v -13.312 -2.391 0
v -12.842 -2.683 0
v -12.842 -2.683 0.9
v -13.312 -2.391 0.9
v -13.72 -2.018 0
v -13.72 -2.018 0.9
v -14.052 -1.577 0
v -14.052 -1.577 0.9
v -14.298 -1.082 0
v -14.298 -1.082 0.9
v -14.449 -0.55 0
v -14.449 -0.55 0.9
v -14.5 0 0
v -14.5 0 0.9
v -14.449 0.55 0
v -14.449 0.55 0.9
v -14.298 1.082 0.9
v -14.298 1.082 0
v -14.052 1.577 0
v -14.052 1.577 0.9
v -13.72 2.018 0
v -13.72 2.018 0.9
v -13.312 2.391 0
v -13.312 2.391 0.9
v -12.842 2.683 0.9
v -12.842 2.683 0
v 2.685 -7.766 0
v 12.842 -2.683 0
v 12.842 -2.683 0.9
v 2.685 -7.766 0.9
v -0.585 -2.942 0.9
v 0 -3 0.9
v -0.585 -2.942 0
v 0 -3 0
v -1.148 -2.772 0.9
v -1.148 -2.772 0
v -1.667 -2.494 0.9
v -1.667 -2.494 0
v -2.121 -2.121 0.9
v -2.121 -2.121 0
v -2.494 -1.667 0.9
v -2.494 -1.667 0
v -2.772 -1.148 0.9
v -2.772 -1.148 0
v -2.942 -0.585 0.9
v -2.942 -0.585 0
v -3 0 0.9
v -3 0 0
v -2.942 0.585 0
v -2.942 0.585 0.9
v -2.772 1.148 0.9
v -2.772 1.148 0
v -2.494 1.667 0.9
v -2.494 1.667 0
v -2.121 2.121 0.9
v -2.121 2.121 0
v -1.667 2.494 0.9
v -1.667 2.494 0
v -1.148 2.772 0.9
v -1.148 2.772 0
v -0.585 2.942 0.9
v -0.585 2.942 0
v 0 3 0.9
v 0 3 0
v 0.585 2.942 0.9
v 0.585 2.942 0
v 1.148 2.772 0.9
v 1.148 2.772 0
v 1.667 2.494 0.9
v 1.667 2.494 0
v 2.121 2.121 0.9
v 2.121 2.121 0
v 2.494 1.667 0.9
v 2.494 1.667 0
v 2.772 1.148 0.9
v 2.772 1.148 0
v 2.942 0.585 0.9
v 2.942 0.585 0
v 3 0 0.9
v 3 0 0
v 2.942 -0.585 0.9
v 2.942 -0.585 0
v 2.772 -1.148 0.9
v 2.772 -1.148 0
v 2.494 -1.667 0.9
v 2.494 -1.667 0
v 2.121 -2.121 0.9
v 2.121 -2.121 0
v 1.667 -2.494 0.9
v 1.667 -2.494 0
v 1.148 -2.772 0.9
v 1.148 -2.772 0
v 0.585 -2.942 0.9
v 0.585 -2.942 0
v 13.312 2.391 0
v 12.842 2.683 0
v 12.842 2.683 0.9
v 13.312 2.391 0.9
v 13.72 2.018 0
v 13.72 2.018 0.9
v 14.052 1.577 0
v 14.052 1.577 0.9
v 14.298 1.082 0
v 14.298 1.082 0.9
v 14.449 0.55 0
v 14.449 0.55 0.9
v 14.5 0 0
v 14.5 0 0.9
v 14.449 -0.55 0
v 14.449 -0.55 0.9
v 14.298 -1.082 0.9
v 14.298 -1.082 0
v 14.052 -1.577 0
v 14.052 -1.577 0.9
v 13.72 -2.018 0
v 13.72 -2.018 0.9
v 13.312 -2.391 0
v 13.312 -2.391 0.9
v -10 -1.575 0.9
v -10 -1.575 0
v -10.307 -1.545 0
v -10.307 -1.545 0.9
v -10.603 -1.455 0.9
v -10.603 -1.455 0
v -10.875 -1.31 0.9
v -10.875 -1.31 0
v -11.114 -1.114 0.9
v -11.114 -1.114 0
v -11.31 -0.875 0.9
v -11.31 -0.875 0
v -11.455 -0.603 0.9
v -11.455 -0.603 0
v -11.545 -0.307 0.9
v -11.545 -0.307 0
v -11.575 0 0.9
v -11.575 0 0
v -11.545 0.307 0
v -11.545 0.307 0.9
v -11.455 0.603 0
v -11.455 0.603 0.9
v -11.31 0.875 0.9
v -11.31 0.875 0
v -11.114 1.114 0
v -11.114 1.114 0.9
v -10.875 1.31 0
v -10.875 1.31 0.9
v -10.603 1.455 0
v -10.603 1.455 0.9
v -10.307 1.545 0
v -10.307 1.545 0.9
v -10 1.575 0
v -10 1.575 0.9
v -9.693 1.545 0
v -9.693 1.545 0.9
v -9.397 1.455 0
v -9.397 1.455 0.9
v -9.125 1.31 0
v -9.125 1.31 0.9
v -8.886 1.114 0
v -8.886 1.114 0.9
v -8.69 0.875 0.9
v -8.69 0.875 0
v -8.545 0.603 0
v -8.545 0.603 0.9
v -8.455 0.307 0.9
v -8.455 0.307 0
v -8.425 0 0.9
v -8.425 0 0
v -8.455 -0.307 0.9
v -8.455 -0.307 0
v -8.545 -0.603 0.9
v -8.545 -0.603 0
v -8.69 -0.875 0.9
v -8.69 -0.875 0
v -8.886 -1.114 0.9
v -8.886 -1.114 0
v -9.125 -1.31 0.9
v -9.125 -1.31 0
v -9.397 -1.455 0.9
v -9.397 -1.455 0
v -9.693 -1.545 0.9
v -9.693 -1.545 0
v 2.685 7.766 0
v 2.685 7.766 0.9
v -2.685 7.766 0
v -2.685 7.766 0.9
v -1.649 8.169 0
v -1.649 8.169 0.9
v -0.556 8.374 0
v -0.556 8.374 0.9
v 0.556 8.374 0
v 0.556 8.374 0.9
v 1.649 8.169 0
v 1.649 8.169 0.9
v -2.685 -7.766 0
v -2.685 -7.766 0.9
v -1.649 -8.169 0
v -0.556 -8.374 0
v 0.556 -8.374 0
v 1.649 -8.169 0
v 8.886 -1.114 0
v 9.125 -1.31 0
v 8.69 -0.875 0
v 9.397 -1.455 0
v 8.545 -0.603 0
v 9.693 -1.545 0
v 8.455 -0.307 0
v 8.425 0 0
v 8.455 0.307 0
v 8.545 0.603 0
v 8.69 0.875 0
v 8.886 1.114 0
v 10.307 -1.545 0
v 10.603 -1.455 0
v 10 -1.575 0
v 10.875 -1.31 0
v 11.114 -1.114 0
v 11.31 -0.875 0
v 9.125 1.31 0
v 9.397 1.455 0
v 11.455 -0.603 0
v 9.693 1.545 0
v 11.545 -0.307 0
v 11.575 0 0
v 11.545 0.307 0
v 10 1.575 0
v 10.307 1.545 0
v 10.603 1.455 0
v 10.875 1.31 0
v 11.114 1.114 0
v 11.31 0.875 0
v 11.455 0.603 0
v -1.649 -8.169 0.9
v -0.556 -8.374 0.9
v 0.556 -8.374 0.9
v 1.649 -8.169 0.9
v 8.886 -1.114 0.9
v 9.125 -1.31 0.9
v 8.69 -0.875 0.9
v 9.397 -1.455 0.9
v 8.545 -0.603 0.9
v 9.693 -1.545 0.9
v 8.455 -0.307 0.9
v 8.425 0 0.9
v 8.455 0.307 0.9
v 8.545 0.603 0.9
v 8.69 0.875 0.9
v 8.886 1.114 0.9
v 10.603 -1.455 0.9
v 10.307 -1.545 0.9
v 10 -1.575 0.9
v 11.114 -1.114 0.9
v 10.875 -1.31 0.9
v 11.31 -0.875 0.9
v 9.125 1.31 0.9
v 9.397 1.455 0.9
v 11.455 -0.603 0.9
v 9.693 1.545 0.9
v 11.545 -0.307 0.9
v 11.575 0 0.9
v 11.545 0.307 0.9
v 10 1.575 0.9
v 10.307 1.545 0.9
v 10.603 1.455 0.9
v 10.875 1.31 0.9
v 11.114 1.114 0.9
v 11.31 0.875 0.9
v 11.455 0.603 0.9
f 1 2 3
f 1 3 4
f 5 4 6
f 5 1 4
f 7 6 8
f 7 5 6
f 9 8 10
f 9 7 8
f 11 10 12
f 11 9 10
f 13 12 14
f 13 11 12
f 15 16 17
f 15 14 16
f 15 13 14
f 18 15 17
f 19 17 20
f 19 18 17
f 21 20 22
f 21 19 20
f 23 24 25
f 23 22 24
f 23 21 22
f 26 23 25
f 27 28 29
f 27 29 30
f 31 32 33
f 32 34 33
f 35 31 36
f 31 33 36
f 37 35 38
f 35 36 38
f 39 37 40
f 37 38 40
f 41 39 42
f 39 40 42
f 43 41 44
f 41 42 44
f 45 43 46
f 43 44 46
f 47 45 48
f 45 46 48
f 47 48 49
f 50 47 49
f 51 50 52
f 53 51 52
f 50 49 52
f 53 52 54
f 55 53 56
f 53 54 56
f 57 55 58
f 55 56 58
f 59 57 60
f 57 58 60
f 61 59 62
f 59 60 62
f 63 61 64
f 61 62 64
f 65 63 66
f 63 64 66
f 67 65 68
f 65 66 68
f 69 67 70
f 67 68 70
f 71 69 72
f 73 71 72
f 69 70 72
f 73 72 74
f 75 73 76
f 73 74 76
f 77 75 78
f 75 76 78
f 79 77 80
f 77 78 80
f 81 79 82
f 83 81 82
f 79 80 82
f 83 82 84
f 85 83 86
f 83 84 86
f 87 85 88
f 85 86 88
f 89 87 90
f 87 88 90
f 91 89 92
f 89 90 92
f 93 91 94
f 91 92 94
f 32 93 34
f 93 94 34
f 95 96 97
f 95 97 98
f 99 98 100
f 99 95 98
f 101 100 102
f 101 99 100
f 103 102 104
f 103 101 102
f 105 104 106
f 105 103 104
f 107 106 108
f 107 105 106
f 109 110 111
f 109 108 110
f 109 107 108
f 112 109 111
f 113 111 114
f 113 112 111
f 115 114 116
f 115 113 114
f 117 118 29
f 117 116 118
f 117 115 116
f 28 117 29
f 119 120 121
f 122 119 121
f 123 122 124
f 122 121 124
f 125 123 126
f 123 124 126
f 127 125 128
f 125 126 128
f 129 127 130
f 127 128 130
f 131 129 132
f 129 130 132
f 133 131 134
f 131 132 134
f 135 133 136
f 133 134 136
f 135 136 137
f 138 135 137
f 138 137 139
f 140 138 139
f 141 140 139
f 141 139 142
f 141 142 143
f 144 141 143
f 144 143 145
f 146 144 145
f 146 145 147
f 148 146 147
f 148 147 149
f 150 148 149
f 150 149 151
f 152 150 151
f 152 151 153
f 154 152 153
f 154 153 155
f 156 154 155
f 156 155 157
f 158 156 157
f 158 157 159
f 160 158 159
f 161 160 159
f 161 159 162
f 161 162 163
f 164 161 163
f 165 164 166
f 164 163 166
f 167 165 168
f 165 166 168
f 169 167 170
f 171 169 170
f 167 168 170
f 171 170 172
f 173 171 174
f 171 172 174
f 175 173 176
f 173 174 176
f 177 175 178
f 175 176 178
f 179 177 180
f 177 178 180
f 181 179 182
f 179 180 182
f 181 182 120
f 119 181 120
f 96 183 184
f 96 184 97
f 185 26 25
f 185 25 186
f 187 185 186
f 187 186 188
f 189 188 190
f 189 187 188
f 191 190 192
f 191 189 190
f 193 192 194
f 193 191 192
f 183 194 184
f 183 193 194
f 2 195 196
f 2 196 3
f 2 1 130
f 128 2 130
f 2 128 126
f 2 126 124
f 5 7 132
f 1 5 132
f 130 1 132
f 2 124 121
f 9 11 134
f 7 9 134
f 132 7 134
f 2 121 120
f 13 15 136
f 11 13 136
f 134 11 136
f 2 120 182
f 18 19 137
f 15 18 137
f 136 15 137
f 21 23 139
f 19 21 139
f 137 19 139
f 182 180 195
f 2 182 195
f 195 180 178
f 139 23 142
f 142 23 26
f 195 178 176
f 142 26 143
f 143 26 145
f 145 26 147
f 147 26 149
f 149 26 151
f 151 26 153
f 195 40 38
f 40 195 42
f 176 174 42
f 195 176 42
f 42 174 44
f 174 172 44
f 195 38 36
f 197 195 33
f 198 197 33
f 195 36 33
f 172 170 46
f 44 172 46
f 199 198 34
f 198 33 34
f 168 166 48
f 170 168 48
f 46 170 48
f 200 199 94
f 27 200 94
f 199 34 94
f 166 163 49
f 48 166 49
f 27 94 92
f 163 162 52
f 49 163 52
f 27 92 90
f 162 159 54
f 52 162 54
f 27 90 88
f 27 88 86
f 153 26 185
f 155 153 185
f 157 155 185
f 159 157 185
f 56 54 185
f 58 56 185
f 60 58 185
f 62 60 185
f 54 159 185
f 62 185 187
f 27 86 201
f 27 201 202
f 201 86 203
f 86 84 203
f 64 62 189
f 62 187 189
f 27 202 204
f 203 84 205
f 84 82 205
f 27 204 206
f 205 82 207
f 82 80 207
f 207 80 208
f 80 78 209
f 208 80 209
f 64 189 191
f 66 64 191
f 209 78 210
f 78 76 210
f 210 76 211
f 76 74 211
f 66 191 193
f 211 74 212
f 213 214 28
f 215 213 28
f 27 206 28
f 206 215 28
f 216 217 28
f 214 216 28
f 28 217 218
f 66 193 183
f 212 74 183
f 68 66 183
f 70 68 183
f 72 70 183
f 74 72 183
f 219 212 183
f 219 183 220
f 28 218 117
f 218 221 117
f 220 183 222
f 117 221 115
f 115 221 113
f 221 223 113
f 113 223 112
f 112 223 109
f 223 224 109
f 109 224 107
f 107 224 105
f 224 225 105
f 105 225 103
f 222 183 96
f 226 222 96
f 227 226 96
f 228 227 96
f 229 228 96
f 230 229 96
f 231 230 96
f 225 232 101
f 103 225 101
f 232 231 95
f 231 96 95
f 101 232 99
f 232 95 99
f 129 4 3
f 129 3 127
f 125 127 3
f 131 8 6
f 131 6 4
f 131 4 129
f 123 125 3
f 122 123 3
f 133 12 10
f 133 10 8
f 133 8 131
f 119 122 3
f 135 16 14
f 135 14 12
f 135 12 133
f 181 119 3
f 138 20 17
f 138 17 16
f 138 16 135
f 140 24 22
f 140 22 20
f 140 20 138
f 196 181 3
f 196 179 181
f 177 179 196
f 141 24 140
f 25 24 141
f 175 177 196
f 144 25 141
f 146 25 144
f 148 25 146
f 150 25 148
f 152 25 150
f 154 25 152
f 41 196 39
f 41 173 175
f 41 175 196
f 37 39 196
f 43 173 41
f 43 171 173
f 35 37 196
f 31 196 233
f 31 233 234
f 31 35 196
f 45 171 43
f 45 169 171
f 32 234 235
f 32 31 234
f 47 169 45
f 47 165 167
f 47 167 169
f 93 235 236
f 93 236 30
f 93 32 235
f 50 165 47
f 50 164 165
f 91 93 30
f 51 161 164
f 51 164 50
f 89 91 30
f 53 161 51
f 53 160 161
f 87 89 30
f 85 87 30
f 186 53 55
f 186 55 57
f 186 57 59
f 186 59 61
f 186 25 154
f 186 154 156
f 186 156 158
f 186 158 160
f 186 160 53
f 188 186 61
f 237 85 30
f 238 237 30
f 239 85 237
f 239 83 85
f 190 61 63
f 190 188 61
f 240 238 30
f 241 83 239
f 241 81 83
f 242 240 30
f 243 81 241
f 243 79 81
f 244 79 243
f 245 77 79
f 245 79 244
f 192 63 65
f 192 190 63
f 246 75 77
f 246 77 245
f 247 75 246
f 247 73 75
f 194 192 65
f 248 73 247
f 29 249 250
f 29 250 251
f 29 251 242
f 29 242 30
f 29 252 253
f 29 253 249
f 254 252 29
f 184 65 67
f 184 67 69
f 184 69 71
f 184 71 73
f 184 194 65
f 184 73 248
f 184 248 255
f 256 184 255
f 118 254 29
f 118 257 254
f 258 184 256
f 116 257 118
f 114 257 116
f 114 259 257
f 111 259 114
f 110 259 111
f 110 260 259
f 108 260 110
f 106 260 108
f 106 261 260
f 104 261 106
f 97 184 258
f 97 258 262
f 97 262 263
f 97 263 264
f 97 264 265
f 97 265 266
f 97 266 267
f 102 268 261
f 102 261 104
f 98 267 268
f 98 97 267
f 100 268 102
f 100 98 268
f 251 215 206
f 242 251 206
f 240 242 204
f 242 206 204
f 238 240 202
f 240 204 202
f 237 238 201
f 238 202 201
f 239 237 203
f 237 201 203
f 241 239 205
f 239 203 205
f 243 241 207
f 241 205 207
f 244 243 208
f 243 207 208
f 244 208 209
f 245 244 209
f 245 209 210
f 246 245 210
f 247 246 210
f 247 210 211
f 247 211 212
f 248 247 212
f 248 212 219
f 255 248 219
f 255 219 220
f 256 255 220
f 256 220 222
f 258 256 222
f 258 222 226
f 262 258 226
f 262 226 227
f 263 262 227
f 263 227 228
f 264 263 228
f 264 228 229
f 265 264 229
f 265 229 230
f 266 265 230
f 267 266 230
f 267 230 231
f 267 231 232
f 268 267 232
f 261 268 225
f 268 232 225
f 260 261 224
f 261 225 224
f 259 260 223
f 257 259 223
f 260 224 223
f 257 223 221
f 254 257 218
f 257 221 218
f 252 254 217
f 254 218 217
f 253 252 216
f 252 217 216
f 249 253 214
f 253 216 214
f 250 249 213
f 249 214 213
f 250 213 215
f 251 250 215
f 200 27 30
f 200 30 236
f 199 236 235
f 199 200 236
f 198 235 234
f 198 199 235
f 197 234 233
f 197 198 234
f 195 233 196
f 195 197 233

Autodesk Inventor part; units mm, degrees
ref_plane "YZ Plane" through (0, 0, 0) normal (1, 0, 0) x (0, 1, 0)
ref_plane "XZ Plane" through (0, 0, 0) normal (0, 1, 0) x (-1, 0, 0)
ref_plane "XY Plane" through (0, 0, 0) normal (0, 0, 1) x (1, 0, 0)
sketch "Esquisse1" plane through (0, 0, 0) normal (0, 0, 1) x (1, 0, 0)
  line L0 (-12.8425, 2.6828) -> (-2.685, 7.7657)
  line L1 (2.685, 7.7657) -> (12.8425, 2.6828)
  line L2 (12.8425, -2.6828) -> (2.685, -7.7657)
  line L3 (-2.685, -7.7657) -> (-12.8425, -2.6828)
  arc A0 (2.685, 7.7657) -> (-2.685, 7.7657) centre (0, 2.4) ccw
  arc A1 (-2.685, -7.7657) -> (2.685, -7.7657) centre (0, -2.4) ccw
  arc A2 (-12.8425, 2.6828) -> (-12.8425, -2.6828) centre (-11.5, 0) ccw
  arc A3 (12.8425, -2.6828) -> (12.8425, 2.6828) centre (11.5, 0) ccw
  point P0 (0, 0)
  point P1 (0, 9.1093)
  point P2 (18.2039, 0)
  point P3 (0, -9.1093)
  point P4 (-18.2039, 0)
  dimension "d0" = 6
  dimension "d1" = 3
  dimension "d2" = 29
  dimension "d3" = 16.8
extrude "Extrusion1" add sketch "Esquisse1" along normal blind 0.9
sketch "Esquisse2" plane through (0, 0, 0.9) normal (0, 0, 1) x (1, 0, 0)
  point P0 (0, 0)
  point P1 (0, 0)
hole "Perçage D6" at (0, 0, 0.9) direction (0, 0, -1) diameter 6 end through all
sketch "Esquisse3" plane through (0, 0, 0.9) normal (0, 0, 1) x (1, 0, 0)
  point P0 (0, 0)
  point P1 (-10, 0)
  point P2 (10, 0)
  dimension "d13" = 20
  dimension "d21" = 10
hole "Perçage D3.15" at (-10, 0, 0.9) at (10, 0, 0.9) direction (0, 0, -1) diameter 3.15 end through all
equation "\"d21\" = 0.5 * d13"
properties part number "Maintient roulement" material "Aluminium"
